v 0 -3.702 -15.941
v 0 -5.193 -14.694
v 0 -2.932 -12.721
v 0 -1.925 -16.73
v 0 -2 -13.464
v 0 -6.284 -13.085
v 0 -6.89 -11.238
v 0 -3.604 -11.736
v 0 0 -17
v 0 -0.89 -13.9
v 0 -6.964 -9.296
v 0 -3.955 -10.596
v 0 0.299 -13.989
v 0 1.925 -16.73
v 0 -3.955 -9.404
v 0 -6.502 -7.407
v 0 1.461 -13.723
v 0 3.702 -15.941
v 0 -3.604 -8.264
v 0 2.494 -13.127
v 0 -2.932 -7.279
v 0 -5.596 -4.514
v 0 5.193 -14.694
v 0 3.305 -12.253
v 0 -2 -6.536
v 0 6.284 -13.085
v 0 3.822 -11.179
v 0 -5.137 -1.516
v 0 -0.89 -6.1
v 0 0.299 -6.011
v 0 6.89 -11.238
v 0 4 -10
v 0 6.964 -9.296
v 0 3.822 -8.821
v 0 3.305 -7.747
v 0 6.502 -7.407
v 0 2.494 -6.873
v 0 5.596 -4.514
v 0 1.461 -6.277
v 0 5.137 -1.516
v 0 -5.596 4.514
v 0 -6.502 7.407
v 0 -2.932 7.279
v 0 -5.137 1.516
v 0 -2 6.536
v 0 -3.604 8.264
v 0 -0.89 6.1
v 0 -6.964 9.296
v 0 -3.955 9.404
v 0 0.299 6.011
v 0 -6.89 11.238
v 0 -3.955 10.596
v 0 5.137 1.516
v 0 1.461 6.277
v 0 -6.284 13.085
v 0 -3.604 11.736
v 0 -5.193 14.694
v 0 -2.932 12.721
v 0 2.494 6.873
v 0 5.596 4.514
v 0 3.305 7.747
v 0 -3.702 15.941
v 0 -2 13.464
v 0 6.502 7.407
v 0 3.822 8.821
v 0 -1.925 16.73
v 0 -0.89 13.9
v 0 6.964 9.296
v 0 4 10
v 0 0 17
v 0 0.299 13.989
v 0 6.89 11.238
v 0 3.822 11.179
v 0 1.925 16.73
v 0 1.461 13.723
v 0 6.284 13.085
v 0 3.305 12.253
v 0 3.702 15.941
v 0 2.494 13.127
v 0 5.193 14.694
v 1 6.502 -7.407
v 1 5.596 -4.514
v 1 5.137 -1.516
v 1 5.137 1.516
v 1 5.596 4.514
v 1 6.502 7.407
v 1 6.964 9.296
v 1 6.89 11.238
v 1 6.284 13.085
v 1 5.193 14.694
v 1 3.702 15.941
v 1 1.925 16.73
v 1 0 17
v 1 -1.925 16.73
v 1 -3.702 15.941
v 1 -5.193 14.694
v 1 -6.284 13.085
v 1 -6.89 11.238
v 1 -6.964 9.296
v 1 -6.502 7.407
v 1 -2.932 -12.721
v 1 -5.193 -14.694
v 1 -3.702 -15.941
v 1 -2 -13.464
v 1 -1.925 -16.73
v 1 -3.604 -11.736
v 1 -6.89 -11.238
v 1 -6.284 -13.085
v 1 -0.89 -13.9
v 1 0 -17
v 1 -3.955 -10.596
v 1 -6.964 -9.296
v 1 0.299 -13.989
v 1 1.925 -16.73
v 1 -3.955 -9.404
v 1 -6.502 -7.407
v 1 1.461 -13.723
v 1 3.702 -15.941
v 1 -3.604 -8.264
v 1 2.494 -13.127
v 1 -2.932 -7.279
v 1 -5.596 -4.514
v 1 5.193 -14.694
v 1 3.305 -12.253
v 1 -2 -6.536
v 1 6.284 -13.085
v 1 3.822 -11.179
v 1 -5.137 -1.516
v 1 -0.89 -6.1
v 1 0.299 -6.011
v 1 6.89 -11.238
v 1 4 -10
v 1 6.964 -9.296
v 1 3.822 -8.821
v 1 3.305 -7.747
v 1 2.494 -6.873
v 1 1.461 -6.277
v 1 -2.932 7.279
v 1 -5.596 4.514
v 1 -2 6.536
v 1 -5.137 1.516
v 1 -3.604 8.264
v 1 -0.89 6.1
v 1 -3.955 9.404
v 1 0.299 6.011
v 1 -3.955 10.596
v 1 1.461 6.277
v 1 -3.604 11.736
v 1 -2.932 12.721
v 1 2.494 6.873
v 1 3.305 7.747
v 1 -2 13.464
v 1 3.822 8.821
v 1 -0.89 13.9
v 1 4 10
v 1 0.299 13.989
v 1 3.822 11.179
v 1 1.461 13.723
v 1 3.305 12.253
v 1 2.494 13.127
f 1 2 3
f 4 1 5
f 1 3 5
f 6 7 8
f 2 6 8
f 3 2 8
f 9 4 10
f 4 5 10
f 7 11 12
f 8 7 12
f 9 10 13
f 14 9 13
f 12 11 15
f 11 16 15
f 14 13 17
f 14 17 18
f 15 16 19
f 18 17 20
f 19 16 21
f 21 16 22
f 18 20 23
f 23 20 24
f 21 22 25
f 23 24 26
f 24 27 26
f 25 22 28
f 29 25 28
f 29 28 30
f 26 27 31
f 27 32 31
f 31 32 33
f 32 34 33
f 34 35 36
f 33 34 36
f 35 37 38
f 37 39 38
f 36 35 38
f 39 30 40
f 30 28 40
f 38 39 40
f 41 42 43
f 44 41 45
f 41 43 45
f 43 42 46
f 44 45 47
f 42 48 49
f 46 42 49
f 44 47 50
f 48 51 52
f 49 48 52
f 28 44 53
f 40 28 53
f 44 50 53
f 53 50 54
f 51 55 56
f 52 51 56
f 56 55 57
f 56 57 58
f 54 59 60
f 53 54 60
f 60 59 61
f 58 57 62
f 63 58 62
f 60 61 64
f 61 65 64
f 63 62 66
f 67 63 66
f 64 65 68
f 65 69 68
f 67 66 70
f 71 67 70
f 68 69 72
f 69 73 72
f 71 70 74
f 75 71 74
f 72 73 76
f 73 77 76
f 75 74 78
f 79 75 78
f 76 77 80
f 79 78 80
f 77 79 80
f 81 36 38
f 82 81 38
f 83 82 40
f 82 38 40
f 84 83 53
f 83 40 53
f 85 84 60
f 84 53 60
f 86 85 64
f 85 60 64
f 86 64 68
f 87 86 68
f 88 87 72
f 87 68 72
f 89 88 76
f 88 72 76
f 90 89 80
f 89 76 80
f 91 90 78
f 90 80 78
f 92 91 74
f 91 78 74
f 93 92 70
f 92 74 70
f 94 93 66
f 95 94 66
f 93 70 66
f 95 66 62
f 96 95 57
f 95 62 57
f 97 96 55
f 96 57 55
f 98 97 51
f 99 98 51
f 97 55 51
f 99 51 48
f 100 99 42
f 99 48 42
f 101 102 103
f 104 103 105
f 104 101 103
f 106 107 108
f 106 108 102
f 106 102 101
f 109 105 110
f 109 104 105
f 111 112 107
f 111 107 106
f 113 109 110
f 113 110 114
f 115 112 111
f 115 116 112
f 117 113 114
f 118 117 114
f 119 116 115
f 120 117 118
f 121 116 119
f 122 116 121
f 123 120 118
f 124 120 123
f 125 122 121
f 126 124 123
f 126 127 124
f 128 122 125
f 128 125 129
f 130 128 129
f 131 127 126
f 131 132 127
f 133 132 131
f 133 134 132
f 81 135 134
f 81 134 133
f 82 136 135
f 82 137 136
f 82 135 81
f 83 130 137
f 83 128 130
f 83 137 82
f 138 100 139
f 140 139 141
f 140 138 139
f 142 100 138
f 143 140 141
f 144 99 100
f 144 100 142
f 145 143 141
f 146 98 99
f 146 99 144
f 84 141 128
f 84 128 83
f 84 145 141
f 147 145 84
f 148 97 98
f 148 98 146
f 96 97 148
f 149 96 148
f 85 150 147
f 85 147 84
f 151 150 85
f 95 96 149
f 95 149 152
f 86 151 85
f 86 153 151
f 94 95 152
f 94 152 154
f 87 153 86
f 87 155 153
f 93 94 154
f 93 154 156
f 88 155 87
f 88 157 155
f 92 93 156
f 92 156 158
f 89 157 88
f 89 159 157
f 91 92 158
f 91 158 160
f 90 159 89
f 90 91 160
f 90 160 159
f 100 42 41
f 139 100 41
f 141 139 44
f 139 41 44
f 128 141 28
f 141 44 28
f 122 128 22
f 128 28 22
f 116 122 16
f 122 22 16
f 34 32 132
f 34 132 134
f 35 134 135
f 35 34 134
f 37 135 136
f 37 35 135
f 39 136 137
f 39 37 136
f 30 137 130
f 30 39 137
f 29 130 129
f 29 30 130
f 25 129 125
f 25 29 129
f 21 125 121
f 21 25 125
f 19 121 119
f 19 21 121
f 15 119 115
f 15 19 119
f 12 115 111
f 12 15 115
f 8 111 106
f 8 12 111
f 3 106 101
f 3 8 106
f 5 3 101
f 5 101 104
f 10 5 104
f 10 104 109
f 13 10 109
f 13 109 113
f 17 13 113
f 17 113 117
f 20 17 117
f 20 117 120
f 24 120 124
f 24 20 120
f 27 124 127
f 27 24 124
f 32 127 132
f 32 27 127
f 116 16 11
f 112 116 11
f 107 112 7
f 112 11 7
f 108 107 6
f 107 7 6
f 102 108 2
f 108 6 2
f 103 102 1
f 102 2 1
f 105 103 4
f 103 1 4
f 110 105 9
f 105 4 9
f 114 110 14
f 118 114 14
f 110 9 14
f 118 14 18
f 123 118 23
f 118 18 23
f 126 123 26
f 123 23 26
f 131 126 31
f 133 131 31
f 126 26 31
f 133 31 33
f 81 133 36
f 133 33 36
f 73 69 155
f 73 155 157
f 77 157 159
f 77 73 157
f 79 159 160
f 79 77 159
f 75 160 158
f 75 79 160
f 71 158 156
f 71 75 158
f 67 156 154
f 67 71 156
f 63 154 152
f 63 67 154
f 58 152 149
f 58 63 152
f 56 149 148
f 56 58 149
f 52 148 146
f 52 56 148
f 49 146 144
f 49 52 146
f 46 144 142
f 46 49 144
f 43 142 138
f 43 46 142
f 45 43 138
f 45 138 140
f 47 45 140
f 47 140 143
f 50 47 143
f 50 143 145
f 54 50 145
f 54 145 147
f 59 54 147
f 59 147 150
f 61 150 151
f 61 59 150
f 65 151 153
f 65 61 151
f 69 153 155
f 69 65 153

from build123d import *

# Parameters (mm, degrees)
F0_R     = 4
F1_DEPTH = 1


with BuildPart() as f1:
    # F0 (on Right) → F1 (new body)
    with BuildSketch(Plane.YZ):
        with BuildLine():
            ThreePointArc((6.502189, -7.407407), (5.079872, 0), (6.502189, 7.407407))
            ThreePointArc((6.502189, 7.407407), (0, 17), (-6.502189, 7.407407))
            ThreePointArc((-6.502189, 7.407407), (-5.079872, 0), (-6.502189, -7.407407))
            ThreePointArc((-6.502189, -7.407407), (0, -17), (6.502189, -7.407407))
        make_face()
        with Locations((0, -10)):
            Circle(F0_R, mode=Mode.SUBTRACT)
        with Locations((0, 10)):
            Circle(F0_R, mode=Mode.SUBTRACT)
    extrude(amount=F1_DEPTH)


solid = f1.part
